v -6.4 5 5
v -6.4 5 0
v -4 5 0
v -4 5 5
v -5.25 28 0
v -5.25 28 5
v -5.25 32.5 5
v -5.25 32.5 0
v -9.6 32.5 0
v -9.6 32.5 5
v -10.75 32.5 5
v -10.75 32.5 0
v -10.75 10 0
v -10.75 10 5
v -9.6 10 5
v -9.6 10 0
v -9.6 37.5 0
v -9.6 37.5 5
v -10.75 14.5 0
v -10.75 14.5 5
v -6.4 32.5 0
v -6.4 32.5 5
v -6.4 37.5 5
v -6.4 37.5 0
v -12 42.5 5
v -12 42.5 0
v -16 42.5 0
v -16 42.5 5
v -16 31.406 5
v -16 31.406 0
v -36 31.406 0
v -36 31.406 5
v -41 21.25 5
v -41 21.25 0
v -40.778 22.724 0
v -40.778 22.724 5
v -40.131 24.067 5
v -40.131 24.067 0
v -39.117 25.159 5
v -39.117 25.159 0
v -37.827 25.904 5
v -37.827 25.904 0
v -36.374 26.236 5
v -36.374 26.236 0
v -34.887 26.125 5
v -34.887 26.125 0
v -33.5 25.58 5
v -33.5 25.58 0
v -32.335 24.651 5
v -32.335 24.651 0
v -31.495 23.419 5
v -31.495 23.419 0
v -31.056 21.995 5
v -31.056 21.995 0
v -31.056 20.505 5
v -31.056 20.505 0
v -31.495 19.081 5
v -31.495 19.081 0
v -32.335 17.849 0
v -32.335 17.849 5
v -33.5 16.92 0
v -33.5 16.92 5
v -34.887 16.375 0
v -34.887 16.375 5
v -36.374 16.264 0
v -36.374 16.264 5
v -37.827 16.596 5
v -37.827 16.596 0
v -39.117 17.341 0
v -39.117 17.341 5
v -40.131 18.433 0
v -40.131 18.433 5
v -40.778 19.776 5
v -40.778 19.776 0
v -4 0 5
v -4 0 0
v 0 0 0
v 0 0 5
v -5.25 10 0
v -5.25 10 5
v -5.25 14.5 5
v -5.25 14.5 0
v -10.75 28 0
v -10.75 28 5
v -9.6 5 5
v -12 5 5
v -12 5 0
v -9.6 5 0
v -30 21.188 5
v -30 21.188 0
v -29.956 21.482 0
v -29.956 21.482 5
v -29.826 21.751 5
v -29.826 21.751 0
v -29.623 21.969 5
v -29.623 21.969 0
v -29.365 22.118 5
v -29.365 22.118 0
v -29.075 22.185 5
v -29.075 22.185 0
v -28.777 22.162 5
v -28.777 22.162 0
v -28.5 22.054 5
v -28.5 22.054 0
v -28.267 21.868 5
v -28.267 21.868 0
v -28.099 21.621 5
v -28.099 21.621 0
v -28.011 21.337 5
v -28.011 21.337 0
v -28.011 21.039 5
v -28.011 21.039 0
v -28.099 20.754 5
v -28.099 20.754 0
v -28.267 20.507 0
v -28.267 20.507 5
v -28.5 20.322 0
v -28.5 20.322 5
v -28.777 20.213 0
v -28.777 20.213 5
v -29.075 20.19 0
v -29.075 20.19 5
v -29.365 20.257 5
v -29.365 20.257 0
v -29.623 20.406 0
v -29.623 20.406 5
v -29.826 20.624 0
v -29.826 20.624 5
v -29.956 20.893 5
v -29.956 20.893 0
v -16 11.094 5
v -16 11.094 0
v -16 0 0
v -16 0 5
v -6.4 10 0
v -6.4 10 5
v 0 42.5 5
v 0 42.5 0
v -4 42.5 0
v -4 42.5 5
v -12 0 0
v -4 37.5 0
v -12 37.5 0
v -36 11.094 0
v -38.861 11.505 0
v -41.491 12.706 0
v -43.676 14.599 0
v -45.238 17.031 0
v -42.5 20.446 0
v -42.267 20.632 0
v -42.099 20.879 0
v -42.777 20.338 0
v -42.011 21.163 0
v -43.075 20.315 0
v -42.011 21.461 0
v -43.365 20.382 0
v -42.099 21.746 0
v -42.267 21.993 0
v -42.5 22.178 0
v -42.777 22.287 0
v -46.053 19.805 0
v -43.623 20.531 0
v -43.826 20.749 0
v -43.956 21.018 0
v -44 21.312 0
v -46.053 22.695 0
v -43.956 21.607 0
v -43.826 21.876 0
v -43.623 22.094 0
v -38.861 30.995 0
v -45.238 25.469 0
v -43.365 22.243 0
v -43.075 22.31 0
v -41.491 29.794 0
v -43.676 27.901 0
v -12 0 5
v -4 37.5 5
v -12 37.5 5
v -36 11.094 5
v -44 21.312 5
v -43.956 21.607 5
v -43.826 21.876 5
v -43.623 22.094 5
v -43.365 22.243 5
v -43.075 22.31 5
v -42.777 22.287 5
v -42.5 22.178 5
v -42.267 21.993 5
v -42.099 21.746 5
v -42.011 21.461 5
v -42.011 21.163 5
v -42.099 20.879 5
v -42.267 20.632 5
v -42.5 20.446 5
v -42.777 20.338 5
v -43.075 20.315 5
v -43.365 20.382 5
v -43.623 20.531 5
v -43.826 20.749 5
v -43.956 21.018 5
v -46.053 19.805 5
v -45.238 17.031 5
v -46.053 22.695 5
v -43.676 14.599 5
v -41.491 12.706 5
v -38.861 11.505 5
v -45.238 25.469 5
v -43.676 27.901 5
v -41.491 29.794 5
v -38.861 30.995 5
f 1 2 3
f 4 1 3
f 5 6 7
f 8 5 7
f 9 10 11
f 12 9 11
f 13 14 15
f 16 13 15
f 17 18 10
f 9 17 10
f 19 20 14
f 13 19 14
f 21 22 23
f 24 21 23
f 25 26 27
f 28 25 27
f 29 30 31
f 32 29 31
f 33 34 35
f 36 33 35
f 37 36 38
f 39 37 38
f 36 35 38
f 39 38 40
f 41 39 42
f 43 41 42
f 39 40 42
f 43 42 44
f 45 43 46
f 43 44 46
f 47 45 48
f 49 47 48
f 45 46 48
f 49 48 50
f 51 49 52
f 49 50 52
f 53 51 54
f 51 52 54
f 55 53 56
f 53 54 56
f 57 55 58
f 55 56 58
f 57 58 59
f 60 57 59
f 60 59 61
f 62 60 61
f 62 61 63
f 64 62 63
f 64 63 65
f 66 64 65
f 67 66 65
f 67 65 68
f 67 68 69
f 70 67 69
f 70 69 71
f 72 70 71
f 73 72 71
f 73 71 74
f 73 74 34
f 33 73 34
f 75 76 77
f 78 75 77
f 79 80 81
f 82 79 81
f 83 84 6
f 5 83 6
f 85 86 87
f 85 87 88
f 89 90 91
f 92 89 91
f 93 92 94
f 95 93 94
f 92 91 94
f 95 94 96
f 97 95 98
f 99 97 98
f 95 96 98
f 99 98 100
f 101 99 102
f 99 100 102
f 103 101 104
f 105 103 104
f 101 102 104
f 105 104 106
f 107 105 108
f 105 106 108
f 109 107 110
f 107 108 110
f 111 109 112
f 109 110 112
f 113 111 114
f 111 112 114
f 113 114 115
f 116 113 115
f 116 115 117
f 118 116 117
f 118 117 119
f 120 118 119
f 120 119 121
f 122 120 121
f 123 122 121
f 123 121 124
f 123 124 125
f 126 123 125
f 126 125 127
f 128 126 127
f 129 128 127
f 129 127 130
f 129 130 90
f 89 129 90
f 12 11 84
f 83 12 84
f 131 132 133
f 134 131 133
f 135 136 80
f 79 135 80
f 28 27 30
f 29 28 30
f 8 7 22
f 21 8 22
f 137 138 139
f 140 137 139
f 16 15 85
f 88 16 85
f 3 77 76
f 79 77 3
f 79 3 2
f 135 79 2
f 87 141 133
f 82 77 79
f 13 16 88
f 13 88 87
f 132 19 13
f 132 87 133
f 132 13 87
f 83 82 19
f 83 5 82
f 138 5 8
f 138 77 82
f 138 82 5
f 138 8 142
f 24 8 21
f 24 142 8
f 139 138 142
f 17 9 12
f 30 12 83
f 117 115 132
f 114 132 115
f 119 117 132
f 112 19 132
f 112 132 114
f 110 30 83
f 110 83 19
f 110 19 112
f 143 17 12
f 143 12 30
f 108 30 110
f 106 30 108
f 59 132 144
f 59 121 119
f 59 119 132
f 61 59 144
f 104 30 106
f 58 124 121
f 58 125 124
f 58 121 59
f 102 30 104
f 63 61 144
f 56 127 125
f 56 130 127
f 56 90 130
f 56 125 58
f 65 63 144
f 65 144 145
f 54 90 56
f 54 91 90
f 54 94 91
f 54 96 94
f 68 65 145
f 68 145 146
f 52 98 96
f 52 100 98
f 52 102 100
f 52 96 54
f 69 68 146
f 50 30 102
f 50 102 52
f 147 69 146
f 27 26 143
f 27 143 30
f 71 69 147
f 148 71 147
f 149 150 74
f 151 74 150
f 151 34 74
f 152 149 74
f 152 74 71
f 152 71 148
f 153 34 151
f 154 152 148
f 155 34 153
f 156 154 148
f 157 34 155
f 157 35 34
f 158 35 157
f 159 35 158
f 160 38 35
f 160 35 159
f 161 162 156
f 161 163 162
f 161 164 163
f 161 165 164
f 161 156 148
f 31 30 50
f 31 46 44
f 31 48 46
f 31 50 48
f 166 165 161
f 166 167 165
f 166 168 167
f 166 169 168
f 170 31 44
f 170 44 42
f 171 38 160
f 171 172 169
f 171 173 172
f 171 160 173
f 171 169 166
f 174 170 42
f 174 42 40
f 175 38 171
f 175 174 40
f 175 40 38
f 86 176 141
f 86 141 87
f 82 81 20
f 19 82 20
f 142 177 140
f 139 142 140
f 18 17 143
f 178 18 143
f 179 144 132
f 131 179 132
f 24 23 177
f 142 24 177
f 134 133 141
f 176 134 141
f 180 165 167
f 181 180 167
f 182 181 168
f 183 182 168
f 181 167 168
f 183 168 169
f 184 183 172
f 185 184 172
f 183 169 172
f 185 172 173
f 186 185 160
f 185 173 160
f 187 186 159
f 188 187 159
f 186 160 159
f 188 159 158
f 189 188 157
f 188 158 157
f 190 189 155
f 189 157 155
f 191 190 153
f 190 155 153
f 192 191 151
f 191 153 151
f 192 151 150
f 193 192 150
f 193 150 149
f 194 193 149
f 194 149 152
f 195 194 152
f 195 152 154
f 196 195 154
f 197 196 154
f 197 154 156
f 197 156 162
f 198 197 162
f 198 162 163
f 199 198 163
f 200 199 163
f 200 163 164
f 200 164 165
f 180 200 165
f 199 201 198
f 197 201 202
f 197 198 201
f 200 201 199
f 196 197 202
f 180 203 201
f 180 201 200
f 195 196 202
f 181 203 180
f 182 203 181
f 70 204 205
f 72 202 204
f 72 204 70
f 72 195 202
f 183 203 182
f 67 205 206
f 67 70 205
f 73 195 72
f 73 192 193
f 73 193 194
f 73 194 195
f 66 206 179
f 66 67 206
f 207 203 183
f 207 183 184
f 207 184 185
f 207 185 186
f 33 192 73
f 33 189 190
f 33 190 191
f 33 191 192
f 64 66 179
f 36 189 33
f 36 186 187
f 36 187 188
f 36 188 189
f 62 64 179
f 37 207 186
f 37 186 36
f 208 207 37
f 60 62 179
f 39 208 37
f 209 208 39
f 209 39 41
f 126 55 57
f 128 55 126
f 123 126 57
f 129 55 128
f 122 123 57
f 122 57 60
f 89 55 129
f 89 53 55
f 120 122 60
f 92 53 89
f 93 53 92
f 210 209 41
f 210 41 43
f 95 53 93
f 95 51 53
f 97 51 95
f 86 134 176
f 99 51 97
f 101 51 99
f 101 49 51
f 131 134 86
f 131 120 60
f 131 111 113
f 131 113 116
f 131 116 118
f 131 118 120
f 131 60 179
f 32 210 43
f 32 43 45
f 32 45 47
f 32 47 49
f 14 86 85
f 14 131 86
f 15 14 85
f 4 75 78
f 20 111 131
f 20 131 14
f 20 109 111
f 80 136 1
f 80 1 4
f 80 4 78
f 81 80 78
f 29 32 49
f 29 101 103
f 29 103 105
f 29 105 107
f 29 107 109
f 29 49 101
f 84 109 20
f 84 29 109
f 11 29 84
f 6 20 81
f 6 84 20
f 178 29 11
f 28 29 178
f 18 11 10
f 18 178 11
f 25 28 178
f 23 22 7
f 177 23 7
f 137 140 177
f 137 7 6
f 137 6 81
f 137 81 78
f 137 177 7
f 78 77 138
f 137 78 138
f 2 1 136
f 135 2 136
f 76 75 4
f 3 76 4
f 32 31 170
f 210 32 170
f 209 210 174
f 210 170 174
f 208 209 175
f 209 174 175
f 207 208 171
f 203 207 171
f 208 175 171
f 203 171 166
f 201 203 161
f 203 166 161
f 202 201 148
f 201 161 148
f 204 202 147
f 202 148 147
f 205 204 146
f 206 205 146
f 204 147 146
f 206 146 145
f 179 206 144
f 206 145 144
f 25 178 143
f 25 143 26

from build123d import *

# Parameters (mm, degrees)
BOSS_EXTRUDE1_DEPTH = 5
SKETCH2_R           = 5
SKETCH2_R_2         = 1
CUT_EXTRUDE1_DEPTH  = 10
SKETCH3_R           = 1
SKETCH3_R_2         = 1.440461169
BOSS_EXTRUDE2_DEPTH = 5
CUT_EXTRUDE2_DEPTH  = 10
SKETCH5_W           = 1
SKETCH5_H           = 5
CUT_EXTRUDE3_DEPTH  = 10


with BuildPart() as part:
    # Sketch1 → Boss-Extrude1 (new body)
    with BuildSketch(Plane.XY):
        with BuildLine():
            Line((-16, 31.40625), (-36, 31.40625))
            ThreePointArc((-36, 31.40625), (-46.15625, 21.25), (-36, 11.09375))
            Line((-36, 11.09375), (-16, 11.09375))
            Line((-16, 11.09375), (-16, 5))
            Line((-16, 5), (-16, 0))
            Line((-16, 0), (-11.25390625, 0))
            Line((-11.25390625, 0), (-11, 0))
            Line((-11, 0), (-11, 0.25390625))
            Line((-11, 0.25390625), (-11, 4.82421875))
            Line((-11, 4.82421875), (-11, 5))
            Line((-11, 5), (-10.74609375, 5))
            Line((-10.74609375, 5), (-8.20703125, 5))
            Line((-8.20703125, 5), (-5, 5))
            Line((-5, 5), (-5, 0))
            Line((-5, 0), (0, 0))
            Line((0, 0), (0, 42.5))
            Line((0, 42.5), (-5, 42.5))
            Line((-5, 42.5), (-5, 37.5))
            Line((-5, 37.5), (-8.20703125, 37.5))
            Line((-8.20703125, 37.5), (-10.74609375, 37.5))
            Line((-10.74609375, 37.5), (-11, 37.5))
            Line((-11, 37.5), (-11, 37.67578125))
            Line((-11, 37.67578125), (-11, 42.24609375))
            Line((-11, 42.24609375), (-11, 42.5))
            Line((-11, 42.5), (-11.25390625, 42.5))
            Line((-11.25390625, 42.5), (-16, 42.5))
            Line((-16, 42.5), (-16, 37.5))
            Line((-16, 37.5), (-16, 31.40625))
        make_face()
    extrude(amount=BOSS_EXTRUDE1_DEPTH)

    # Sketch2 → Cut-Extrude1 (cut)
    with BuildSketch(Plane(origin=(0, 0, 0), x_dir=(-1, 0, 0), z_dir=(0, 0, -1))):
        with Locations((36, 21.25)):
            Circle(SKETCH2_R)
        with Locations((43, 21.312454575)):
            Circle(SKETCH2_R_2)
        with Locations((36.062454575, 14.25)):
            Circle(SKETCH2_R_2)
        with Locations((29, 21.187545425)):
            Circle(SKETCH2_R_2)
        with Locations((35.937545425, 28.25)):
            Circle(SKETCH2_R_2)
    extrude(amount=-CUT_EXTRUDE1_DEPTH, mode=Mode.SUBTRACT)

    # Sketch3 → Boss-Extrude2 (add)
    with BuildSketch(Plane(origin=(0, 0, 0), x_dir=(-1, 0, 0), z_dir=(0, 0, -1))):
        with Locations((35.937545425, 28.25)):
            Circle(SKETCH3_R)
        with Locations((36.062454575, 14.25)):
            Circle(SKETCH3_R_2)
    extrude(amount=-BOSS_EXTRUDE2_DEPTH)

    # Sketch4 → Cut-Extrude2 (cut)
    with BuildSketch(Plane.XY.offset(5)):
        Polygon((-9.6, 5), (-6.4, 5), (-6.4, 10), (-5.25, 10), (-5.25, 14.5), (-10.75, 14.5), (-10.75, 10), (-9.6, 10), align=None)
        Polygon((-10.75, 32.5), (-10.75, 28), (-5.25, 28), (-5.25, 32.5), (-6.4, 32.5), (-6.4, 37.5), (-9.6, 37.5), (-9.6, 32.5), align=None)
    extrude(amount=-CUT_EXTRUDE2_DEPTH, mode=Mode.SUBTRACT)

    # Sketch5 → Cut-Extrude3 (cut)
    with BuildSketch(Plane.XY.offset(5)):
        with Locations((-4.5, 2.5)):
            Rectangle(SKETCH5_W, SKETCH5_H)
        with Locations((-11.5, 2.5)):
            Rectangle(SKETCH5_W, SKETCH5_H)
        with Locations((-11.5, 40)):
            Rectangle(SKETCH5_W, SKETCH5_H)
        with Locations((-4.5, 40)):
            Rectangle(SKETCH5_W, SKETCH5_H)
    extrude(amount=-CUT_EXTRUDE3_DEPTH, mode=Mode.SUBTRACT)


solid = part.part
